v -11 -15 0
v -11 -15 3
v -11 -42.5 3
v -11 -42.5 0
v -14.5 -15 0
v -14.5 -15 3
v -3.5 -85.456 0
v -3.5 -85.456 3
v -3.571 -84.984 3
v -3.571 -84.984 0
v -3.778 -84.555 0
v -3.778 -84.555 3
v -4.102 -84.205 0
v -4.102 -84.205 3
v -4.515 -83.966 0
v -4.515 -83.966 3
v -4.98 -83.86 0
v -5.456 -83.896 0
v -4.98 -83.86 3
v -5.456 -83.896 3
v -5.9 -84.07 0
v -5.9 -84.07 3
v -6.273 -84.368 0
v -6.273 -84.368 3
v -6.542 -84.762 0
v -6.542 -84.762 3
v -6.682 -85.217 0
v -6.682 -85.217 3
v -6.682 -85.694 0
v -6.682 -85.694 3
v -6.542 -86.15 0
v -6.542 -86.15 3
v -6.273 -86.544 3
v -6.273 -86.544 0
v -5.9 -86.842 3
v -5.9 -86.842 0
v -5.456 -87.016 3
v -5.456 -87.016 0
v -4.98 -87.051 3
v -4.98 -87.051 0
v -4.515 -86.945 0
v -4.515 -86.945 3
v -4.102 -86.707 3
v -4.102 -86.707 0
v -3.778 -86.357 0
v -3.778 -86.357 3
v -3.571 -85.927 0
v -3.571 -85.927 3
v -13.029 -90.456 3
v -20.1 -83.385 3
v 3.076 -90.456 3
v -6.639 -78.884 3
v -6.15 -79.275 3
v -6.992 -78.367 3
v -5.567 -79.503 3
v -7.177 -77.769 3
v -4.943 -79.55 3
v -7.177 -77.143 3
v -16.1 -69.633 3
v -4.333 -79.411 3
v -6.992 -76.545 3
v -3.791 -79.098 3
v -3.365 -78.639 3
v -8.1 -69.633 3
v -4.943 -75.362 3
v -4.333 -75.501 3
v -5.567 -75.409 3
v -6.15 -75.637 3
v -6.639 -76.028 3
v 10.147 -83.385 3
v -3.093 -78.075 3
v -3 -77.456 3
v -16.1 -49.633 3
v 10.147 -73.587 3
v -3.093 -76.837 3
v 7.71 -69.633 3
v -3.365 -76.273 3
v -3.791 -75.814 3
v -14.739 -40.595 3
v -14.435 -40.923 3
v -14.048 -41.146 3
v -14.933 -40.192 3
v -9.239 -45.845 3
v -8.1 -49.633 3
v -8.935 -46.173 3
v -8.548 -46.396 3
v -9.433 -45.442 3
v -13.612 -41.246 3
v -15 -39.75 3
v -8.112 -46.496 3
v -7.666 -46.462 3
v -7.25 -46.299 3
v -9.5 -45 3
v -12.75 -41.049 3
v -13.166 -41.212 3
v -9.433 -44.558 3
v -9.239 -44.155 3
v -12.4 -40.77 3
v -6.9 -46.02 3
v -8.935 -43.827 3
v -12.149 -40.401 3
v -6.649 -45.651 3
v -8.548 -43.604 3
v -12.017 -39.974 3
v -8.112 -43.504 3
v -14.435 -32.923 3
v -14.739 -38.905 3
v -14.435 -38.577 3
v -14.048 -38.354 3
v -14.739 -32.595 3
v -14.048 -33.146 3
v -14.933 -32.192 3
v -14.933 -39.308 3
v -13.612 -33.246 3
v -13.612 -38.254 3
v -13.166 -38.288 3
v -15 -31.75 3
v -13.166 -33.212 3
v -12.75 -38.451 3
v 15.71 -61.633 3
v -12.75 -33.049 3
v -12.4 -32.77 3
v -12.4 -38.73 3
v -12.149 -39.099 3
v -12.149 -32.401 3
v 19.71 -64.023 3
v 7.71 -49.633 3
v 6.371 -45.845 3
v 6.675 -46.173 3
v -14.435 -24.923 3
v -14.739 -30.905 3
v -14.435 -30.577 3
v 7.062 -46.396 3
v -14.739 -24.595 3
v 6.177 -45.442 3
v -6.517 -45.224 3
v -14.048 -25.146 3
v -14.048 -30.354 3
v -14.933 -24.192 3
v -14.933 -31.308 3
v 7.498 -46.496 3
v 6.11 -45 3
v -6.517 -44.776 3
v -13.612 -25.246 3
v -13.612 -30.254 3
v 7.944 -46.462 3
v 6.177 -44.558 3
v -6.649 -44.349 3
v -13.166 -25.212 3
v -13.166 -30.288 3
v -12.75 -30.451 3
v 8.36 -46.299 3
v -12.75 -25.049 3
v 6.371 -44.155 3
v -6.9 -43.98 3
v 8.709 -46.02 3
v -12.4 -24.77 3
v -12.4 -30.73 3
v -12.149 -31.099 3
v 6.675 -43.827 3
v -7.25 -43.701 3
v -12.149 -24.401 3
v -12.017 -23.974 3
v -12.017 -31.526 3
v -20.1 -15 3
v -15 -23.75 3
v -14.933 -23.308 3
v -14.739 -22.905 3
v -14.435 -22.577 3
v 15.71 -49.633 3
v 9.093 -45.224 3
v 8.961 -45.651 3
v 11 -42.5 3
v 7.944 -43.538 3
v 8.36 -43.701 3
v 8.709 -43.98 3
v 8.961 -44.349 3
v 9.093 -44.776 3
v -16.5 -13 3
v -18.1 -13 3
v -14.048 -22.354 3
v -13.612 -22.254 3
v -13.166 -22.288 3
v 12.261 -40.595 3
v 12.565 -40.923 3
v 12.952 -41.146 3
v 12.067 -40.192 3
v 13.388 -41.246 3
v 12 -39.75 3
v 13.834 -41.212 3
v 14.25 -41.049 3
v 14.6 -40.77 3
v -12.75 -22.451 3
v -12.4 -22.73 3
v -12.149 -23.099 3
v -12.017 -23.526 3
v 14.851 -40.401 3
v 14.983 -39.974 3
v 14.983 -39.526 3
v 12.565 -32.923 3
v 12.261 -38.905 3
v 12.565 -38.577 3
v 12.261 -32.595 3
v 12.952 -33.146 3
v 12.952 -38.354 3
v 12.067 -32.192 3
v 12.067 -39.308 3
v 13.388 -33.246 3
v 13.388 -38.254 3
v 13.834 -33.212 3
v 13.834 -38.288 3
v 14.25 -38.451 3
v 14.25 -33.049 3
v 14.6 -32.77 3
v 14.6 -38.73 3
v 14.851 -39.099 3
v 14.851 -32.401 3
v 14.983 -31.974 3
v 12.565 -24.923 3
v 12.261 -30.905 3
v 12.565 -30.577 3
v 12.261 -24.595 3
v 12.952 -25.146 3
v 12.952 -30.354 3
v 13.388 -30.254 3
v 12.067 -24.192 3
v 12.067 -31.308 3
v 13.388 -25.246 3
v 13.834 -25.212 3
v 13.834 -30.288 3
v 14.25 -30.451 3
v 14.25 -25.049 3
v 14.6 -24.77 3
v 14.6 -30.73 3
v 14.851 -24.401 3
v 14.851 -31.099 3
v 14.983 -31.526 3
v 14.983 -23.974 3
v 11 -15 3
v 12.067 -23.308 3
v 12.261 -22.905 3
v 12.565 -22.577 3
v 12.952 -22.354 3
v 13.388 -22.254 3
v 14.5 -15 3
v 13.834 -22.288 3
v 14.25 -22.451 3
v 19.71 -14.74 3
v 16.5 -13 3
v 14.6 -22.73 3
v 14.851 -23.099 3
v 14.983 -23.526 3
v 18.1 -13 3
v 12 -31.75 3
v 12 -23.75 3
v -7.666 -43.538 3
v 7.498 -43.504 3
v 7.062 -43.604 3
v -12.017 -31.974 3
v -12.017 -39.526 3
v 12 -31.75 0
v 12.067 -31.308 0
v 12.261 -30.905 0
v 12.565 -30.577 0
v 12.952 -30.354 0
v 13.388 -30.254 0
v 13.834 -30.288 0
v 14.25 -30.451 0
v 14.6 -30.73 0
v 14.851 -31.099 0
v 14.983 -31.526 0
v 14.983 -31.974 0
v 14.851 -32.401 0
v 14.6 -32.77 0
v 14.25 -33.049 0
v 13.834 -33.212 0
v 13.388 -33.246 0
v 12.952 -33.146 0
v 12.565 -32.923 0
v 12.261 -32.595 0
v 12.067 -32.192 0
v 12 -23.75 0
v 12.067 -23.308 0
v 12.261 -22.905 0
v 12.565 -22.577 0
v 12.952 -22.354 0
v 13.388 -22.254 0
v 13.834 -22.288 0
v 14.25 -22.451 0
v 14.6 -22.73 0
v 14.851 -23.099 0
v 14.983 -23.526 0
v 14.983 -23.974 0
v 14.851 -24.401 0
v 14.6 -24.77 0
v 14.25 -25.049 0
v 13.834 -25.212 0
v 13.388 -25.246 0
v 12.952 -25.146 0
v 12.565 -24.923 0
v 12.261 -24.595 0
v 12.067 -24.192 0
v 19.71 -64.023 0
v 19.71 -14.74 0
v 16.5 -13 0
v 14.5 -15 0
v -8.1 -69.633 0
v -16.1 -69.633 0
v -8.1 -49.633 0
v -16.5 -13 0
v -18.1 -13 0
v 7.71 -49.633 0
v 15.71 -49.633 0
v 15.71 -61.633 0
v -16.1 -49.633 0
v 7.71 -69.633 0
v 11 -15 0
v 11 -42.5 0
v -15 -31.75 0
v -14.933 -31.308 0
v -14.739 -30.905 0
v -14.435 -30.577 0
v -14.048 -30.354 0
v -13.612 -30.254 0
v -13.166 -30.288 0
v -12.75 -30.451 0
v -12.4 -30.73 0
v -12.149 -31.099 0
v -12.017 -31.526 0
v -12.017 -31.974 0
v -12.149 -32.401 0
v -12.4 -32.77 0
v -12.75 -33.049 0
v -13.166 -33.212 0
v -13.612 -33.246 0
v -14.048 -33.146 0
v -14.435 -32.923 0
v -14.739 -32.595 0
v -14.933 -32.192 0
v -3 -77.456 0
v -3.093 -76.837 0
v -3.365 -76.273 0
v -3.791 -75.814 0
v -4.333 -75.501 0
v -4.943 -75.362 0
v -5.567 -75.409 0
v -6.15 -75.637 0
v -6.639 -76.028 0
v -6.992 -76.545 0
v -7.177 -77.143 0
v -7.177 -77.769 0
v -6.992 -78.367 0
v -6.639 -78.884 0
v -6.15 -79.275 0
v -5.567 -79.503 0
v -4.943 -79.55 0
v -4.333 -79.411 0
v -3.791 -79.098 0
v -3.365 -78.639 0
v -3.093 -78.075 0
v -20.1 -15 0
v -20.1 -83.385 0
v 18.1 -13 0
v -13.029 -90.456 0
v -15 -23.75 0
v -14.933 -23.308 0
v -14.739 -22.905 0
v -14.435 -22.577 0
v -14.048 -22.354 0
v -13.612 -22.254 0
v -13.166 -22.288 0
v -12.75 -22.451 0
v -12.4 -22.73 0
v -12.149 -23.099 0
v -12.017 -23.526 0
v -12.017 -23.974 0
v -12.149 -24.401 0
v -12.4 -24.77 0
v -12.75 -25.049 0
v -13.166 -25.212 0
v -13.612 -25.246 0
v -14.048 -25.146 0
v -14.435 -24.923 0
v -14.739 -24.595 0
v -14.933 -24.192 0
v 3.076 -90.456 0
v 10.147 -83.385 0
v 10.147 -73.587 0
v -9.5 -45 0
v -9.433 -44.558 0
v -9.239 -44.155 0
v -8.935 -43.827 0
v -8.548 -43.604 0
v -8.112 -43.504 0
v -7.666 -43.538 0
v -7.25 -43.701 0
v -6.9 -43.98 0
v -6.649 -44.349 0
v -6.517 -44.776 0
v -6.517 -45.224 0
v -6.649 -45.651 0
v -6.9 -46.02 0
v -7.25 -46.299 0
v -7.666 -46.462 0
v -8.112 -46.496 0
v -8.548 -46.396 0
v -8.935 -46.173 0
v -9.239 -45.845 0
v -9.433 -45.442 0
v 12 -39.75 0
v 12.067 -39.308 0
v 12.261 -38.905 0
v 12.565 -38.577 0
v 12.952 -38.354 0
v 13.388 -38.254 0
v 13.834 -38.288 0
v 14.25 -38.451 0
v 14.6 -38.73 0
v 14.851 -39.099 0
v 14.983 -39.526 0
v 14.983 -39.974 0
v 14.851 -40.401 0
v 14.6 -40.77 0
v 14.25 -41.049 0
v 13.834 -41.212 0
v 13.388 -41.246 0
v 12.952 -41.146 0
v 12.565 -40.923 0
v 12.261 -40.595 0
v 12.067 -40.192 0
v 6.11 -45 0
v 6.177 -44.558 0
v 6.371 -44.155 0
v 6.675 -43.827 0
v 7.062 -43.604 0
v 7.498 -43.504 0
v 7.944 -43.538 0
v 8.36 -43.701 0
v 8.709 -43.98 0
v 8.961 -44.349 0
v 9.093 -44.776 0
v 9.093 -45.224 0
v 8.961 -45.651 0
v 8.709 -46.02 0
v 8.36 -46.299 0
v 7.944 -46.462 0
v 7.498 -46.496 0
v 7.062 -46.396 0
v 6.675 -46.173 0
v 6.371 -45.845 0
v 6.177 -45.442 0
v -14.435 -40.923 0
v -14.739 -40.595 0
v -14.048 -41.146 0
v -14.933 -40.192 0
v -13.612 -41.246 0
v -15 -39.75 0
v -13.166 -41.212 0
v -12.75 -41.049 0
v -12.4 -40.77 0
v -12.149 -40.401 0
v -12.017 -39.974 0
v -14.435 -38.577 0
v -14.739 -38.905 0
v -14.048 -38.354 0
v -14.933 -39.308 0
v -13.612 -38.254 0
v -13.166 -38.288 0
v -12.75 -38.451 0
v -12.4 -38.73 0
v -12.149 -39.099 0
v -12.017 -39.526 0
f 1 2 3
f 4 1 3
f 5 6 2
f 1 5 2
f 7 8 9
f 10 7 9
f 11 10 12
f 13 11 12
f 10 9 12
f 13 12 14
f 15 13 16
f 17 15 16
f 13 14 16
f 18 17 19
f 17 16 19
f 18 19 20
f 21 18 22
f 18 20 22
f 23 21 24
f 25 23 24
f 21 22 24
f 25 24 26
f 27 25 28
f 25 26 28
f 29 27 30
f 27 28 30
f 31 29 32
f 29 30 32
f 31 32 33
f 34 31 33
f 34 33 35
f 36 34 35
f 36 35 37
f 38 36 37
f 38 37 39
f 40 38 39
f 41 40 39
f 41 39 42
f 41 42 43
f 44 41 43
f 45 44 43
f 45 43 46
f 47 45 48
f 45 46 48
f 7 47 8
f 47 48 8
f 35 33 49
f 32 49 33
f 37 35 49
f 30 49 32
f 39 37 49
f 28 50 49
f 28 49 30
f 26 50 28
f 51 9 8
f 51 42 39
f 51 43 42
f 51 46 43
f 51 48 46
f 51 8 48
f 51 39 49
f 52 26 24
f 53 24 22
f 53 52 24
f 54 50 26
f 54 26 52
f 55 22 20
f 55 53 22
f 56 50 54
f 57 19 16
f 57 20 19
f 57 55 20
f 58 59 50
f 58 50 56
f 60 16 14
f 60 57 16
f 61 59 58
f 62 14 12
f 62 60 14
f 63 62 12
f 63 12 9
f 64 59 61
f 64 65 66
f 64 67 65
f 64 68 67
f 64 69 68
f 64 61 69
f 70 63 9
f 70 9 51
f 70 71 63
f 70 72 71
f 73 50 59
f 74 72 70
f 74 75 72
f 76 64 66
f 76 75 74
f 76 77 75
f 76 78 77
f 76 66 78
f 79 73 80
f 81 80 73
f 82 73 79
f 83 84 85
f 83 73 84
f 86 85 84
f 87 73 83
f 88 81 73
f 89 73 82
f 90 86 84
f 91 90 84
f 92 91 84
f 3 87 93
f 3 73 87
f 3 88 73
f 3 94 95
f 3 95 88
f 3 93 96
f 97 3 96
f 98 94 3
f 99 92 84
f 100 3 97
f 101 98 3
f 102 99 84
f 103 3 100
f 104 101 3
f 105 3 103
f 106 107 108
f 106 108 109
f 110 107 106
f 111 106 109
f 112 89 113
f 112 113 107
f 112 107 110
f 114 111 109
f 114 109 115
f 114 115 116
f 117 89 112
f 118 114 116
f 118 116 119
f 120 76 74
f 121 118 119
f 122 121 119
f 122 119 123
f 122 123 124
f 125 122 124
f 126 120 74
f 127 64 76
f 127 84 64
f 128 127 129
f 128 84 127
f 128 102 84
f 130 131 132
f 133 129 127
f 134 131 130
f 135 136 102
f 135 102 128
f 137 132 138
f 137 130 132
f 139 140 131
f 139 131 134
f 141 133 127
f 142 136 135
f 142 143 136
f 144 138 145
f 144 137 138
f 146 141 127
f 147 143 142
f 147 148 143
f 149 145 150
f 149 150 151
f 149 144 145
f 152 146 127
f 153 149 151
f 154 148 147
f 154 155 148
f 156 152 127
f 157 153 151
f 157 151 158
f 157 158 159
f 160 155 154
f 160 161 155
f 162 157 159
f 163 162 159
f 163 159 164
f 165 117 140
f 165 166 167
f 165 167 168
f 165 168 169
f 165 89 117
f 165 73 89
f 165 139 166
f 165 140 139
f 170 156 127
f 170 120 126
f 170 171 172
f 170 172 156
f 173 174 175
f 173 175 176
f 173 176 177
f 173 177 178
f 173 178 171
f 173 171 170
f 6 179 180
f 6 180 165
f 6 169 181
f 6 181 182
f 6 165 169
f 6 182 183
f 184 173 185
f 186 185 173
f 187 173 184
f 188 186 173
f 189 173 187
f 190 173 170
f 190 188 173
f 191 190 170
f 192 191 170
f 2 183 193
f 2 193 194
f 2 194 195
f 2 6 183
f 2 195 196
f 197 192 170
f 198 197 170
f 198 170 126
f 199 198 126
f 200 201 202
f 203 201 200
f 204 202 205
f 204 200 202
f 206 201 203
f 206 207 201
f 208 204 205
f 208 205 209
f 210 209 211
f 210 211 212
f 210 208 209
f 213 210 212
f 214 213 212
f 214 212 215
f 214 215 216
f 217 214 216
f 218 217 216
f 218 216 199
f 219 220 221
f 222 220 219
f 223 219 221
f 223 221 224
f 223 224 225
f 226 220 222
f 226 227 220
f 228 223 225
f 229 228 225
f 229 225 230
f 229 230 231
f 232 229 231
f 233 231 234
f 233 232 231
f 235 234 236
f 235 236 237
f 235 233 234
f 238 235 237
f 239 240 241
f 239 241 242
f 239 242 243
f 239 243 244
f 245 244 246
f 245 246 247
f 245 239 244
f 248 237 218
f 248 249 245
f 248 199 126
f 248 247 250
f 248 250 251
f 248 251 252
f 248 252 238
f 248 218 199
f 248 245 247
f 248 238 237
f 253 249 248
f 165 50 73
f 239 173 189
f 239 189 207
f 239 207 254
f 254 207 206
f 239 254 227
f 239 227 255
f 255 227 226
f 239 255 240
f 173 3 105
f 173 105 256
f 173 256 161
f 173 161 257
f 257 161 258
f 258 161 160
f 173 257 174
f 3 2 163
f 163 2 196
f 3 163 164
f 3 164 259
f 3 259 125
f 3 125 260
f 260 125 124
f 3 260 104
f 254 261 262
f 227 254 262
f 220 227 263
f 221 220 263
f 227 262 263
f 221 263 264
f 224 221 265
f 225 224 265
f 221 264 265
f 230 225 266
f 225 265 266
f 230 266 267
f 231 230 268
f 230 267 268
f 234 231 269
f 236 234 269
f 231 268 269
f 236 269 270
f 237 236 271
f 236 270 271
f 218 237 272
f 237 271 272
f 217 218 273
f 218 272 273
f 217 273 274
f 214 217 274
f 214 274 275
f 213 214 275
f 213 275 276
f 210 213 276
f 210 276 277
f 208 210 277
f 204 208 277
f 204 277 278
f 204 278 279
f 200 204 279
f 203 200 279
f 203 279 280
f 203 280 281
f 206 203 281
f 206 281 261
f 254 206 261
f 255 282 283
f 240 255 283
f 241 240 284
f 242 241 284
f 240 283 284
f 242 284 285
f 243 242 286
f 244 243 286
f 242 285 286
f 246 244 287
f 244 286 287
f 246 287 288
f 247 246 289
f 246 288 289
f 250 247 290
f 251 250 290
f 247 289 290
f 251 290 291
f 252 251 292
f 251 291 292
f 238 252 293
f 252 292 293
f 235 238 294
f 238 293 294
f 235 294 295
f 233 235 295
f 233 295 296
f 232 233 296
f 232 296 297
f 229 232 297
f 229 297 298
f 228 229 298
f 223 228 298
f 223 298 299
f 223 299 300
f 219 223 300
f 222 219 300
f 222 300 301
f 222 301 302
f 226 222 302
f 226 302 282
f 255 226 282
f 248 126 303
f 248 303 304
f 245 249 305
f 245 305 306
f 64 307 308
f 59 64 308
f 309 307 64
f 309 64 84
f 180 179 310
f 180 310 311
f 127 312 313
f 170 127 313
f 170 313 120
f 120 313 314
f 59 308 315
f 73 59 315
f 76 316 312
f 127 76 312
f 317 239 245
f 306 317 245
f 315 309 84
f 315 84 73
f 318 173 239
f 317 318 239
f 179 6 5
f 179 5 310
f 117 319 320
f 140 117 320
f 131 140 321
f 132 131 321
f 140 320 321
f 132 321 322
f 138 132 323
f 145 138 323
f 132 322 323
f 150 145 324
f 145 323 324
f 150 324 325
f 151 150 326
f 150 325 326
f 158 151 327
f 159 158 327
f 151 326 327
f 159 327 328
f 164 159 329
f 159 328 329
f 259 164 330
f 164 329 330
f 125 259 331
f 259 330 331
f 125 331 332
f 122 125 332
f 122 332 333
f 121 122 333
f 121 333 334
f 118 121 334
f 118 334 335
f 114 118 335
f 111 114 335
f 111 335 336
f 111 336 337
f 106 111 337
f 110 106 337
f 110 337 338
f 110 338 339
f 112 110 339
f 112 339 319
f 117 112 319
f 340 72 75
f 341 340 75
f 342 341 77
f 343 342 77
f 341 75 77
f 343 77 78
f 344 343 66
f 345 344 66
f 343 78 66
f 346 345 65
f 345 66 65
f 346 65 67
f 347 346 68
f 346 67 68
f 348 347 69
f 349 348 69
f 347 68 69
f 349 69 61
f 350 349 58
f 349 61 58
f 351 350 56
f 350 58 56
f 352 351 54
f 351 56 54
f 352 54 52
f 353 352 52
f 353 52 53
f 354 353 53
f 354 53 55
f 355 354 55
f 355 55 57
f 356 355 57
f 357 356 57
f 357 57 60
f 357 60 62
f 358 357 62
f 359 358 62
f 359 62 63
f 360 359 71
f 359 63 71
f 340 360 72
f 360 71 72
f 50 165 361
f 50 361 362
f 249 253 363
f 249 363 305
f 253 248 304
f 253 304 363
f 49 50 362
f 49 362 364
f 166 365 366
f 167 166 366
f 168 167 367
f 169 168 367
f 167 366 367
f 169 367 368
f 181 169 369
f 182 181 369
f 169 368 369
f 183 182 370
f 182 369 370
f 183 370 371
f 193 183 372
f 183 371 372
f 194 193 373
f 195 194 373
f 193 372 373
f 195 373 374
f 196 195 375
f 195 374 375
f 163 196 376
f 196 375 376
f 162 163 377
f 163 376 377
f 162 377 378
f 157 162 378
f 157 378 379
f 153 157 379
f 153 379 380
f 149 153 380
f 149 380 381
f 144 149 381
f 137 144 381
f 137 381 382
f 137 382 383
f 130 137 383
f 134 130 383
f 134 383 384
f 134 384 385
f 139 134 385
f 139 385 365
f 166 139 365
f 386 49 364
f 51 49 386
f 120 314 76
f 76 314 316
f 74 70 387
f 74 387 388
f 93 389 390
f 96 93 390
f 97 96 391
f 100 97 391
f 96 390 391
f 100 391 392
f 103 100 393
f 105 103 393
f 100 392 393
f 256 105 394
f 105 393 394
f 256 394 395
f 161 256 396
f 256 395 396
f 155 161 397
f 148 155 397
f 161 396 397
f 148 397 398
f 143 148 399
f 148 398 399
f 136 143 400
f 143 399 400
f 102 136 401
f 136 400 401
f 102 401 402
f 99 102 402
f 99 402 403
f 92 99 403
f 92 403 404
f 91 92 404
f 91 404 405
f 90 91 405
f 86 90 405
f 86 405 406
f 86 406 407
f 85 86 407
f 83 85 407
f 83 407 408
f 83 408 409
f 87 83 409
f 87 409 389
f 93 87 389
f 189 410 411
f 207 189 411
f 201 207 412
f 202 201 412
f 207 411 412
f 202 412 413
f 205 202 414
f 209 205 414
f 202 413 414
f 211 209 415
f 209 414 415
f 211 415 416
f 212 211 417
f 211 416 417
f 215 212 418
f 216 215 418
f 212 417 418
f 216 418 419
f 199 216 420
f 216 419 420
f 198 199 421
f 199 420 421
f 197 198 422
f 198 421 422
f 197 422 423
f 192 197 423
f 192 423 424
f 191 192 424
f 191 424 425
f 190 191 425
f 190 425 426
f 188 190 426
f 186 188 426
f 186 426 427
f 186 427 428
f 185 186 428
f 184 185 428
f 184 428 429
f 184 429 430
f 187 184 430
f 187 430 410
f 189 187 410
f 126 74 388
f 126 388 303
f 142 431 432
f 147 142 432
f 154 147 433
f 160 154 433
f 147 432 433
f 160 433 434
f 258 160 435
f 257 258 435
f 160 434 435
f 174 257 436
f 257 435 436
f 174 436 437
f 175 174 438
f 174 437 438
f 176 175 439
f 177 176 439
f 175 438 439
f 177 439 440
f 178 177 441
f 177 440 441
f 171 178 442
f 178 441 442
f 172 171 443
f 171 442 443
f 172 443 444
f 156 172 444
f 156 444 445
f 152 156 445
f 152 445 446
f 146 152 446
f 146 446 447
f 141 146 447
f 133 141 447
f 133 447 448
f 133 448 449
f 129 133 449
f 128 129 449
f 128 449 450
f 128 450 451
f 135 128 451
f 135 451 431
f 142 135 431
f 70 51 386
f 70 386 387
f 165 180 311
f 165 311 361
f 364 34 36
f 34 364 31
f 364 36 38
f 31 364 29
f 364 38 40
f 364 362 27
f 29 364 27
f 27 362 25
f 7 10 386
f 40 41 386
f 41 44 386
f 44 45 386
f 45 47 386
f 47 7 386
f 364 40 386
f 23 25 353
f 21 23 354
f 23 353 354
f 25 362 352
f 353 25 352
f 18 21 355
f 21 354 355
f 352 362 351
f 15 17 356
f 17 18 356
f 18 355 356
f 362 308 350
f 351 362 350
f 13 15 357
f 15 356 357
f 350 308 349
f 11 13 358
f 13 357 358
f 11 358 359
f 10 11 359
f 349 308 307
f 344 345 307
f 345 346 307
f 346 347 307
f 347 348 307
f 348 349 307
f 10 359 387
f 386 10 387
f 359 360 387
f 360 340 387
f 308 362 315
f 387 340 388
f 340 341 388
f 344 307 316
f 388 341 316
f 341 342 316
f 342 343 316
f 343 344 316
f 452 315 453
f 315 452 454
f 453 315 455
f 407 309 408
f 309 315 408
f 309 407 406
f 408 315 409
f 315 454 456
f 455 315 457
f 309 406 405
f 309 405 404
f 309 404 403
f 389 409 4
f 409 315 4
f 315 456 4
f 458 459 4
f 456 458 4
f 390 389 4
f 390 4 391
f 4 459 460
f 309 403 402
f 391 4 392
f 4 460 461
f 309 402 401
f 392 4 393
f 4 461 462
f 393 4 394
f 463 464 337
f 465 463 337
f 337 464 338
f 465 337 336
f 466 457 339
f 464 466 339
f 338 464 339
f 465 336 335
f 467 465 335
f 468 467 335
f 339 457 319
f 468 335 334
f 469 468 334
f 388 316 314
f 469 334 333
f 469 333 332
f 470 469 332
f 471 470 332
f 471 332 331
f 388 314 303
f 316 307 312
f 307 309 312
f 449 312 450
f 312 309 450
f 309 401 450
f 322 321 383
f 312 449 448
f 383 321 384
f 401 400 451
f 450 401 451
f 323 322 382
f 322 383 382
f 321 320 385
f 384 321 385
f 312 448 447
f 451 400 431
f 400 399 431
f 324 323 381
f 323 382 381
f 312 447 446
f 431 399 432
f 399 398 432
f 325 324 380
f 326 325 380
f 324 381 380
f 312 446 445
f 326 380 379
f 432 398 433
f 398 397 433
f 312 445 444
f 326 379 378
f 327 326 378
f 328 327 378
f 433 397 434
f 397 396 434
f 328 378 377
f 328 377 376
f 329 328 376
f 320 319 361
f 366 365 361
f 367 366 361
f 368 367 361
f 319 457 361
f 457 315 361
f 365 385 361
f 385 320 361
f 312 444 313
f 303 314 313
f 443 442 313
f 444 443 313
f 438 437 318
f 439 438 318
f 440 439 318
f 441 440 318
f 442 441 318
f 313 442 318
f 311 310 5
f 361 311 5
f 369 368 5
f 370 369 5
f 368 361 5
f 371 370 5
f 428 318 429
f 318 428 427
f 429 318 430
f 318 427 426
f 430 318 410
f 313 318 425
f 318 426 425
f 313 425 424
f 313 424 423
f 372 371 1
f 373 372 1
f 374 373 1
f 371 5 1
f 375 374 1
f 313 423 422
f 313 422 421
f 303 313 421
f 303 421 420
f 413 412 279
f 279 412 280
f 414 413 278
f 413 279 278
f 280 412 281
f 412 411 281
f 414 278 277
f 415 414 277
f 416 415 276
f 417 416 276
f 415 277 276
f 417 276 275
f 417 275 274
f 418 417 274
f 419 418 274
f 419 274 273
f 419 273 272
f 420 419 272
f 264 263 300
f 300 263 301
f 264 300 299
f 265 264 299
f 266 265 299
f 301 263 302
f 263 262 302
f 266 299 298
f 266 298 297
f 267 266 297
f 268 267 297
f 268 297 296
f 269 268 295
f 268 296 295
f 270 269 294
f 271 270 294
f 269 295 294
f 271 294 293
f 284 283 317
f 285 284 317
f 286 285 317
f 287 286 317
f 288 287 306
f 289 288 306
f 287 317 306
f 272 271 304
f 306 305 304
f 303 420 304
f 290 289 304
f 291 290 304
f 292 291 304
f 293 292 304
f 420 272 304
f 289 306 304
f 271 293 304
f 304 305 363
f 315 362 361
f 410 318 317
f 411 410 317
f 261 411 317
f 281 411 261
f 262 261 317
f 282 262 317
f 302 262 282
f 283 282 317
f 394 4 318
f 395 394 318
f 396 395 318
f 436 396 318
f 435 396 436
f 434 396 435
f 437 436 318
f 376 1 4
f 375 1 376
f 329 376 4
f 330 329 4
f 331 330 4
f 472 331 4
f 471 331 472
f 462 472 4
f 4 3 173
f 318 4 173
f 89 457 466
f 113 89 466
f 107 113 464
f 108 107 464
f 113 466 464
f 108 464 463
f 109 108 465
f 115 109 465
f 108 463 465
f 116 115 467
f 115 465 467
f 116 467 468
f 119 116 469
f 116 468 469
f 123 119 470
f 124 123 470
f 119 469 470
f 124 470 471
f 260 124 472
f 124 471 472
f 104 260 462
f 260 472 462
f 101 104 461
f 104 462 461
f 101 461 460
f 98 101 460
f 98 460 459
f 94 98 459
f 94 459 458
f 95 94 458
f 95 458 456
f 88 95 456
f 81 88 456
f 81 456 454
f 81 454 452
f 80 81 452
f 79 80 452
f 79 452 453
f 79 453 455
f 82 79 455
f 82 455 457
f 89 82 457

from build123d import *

# Parameters (mm, degrees)
IZIM1_R                     = 2.1
IZIM1_R_2                   = 1.6
Y_KSEKLIK_EKSTR_ZYON1_DEPTH = 3
Y_KSEKLIK_EKSTR_ZYON2_DEPTH = 3
IZIM5_R                     = 1.5
KES_EKSTR_ZYON1_DEPTH       = 4
SKETCH3_W                   = 8
SKETCH3_H                   = 20
CUT_EXTRUDE1_DEPTH          = 10


with BuildPart() as part:
    # Çizim1 → Yükseklik-Ekstrüzyon1 (new body)
    with BuildSketch(Plane.XY.offset(3)):
        with BuildLine():
            Line((-20.1, -15), (-20.1, -83.384802))
            Line((-20.1, -83.384802), (-13.028932188, -90.455869812))
            Line((-13.028932188, -90.455869812), (3.075751729, -90.455869812))
            Line((3.075751729, -90.455869812), (10.146819541, -83.384802))
            Line((10.146819541, -83.384802), (10.146819541, -73.586547015))
            Line((10.146819541, -73.586547015), (19.709913851, -64.023452705))
            Line((19.709913851, -64.023452705), (19.709913851, -14.740055992))
            Line((19.709913851, -14.740055992), (18.1, -13))
            Line((18.1, -13), (16.5, -13))
            Line((16.5, -13), (14.5, -15))
            Line((14.5, -15), (14.5, -41.5))
            ThreePointArc((14.5, -41.5), (14.207106781, -42.207106781), (13.5, -42.5))
            Line((13.5, -42.5), (-13.5, -42.5))
            ThreePointArc((-13.5, -42.5), (-14.207106781, -42.207106781), (-14.5, -41.5))
            Line((-14.5, -41.5), (-14.5, -15))
            Line((-14.5, -15), (-16.5, -13))
            Line((-16.5, -13), (-18.1, -13))
            Line((-18.1, -13), (-20.1, -15))
        make_face()
        with Locations((-5.1, -77.455869812)):
            Circle(IZIM1_R, mode=Mode.SUBTRACT)
        with Locations((-5.1, -85.455869812)):
            Circle(IZIM1_R_2, mode=Mode.SUBTRACT)
    extrude(amount=-Y_KSEKLIK_EKSTR_ZYON1_DEPTH)

    # Çizim4 → Yükseklik-Ekstrüzyon2 (add)
    with BuildSketch(Plane.XY.offset(3)):
        Polygon((-16.5, -13), (-14.5, -15), (-11, -15), (-11, -42.5), (11, -42.5), (11, -15), (14.5, -15), (16.5, -13), (16.5, -43.147363563), (-16.5, -43.147363563), align=None)
    extrude(amount=-Y_KSEKLIK_EKSTR_ZYON2_DEPTH)

    # Çizim5 → Kes-Ekstrüzyon1 (cut)
    with BuildSketch(Plane(origin=(0, 0, 0), x_dir=(-1, 0, 0), z_dir=(0, 0, -1))):
        with Locations((-13.5, -23.75)):
            Circle(IZIM5_R)
        with Locations((-13.5, -31.75)):
            Circle(IZIM5_R)
        with Locations((-13.5, -39.75)):
            Circle(IZIM5_R)
        with Locations((-7.609913851, -45)):
            Circle(IZIM5_R)
        with Locations((8, -45)):
            Circle(IZIM5_R)
        with Locations((13.5, -39.75)):
            Circle(IZIM5_R)
        with Locations((13.5, -31.75)):
            Circle(IZIM5_R)
        with Locations((13.5, -23.75)):
            Circle(IZIM5_R)
    extrude(amount=-KES_EKSTR_ZYON1_DEPTH, mode=Mode.SUBTRACT)

    # Sketch3 → Cut-Extrude1 (cut)
    with BuildSketch(Plane(origin=(0, 0, 0), x_dir=(-1, 0, 0), z_dir=(0, 0, -1))):
        with Locations((12.1, -59.633395866)):
            Rectangle(SKETCH3_W, SKETCH3_H)
        Polygon((-15.709913851, -49.633395866), (-15.709913851, -61.633395866), (-7.709913851, -69.633395866), (-7.709913851, -49.633395866), align=None)
    extrude(amount=-CUT_EXTRUDE1_DEPTH, mode=Mode.SUBTRACT)


solid = part.part
